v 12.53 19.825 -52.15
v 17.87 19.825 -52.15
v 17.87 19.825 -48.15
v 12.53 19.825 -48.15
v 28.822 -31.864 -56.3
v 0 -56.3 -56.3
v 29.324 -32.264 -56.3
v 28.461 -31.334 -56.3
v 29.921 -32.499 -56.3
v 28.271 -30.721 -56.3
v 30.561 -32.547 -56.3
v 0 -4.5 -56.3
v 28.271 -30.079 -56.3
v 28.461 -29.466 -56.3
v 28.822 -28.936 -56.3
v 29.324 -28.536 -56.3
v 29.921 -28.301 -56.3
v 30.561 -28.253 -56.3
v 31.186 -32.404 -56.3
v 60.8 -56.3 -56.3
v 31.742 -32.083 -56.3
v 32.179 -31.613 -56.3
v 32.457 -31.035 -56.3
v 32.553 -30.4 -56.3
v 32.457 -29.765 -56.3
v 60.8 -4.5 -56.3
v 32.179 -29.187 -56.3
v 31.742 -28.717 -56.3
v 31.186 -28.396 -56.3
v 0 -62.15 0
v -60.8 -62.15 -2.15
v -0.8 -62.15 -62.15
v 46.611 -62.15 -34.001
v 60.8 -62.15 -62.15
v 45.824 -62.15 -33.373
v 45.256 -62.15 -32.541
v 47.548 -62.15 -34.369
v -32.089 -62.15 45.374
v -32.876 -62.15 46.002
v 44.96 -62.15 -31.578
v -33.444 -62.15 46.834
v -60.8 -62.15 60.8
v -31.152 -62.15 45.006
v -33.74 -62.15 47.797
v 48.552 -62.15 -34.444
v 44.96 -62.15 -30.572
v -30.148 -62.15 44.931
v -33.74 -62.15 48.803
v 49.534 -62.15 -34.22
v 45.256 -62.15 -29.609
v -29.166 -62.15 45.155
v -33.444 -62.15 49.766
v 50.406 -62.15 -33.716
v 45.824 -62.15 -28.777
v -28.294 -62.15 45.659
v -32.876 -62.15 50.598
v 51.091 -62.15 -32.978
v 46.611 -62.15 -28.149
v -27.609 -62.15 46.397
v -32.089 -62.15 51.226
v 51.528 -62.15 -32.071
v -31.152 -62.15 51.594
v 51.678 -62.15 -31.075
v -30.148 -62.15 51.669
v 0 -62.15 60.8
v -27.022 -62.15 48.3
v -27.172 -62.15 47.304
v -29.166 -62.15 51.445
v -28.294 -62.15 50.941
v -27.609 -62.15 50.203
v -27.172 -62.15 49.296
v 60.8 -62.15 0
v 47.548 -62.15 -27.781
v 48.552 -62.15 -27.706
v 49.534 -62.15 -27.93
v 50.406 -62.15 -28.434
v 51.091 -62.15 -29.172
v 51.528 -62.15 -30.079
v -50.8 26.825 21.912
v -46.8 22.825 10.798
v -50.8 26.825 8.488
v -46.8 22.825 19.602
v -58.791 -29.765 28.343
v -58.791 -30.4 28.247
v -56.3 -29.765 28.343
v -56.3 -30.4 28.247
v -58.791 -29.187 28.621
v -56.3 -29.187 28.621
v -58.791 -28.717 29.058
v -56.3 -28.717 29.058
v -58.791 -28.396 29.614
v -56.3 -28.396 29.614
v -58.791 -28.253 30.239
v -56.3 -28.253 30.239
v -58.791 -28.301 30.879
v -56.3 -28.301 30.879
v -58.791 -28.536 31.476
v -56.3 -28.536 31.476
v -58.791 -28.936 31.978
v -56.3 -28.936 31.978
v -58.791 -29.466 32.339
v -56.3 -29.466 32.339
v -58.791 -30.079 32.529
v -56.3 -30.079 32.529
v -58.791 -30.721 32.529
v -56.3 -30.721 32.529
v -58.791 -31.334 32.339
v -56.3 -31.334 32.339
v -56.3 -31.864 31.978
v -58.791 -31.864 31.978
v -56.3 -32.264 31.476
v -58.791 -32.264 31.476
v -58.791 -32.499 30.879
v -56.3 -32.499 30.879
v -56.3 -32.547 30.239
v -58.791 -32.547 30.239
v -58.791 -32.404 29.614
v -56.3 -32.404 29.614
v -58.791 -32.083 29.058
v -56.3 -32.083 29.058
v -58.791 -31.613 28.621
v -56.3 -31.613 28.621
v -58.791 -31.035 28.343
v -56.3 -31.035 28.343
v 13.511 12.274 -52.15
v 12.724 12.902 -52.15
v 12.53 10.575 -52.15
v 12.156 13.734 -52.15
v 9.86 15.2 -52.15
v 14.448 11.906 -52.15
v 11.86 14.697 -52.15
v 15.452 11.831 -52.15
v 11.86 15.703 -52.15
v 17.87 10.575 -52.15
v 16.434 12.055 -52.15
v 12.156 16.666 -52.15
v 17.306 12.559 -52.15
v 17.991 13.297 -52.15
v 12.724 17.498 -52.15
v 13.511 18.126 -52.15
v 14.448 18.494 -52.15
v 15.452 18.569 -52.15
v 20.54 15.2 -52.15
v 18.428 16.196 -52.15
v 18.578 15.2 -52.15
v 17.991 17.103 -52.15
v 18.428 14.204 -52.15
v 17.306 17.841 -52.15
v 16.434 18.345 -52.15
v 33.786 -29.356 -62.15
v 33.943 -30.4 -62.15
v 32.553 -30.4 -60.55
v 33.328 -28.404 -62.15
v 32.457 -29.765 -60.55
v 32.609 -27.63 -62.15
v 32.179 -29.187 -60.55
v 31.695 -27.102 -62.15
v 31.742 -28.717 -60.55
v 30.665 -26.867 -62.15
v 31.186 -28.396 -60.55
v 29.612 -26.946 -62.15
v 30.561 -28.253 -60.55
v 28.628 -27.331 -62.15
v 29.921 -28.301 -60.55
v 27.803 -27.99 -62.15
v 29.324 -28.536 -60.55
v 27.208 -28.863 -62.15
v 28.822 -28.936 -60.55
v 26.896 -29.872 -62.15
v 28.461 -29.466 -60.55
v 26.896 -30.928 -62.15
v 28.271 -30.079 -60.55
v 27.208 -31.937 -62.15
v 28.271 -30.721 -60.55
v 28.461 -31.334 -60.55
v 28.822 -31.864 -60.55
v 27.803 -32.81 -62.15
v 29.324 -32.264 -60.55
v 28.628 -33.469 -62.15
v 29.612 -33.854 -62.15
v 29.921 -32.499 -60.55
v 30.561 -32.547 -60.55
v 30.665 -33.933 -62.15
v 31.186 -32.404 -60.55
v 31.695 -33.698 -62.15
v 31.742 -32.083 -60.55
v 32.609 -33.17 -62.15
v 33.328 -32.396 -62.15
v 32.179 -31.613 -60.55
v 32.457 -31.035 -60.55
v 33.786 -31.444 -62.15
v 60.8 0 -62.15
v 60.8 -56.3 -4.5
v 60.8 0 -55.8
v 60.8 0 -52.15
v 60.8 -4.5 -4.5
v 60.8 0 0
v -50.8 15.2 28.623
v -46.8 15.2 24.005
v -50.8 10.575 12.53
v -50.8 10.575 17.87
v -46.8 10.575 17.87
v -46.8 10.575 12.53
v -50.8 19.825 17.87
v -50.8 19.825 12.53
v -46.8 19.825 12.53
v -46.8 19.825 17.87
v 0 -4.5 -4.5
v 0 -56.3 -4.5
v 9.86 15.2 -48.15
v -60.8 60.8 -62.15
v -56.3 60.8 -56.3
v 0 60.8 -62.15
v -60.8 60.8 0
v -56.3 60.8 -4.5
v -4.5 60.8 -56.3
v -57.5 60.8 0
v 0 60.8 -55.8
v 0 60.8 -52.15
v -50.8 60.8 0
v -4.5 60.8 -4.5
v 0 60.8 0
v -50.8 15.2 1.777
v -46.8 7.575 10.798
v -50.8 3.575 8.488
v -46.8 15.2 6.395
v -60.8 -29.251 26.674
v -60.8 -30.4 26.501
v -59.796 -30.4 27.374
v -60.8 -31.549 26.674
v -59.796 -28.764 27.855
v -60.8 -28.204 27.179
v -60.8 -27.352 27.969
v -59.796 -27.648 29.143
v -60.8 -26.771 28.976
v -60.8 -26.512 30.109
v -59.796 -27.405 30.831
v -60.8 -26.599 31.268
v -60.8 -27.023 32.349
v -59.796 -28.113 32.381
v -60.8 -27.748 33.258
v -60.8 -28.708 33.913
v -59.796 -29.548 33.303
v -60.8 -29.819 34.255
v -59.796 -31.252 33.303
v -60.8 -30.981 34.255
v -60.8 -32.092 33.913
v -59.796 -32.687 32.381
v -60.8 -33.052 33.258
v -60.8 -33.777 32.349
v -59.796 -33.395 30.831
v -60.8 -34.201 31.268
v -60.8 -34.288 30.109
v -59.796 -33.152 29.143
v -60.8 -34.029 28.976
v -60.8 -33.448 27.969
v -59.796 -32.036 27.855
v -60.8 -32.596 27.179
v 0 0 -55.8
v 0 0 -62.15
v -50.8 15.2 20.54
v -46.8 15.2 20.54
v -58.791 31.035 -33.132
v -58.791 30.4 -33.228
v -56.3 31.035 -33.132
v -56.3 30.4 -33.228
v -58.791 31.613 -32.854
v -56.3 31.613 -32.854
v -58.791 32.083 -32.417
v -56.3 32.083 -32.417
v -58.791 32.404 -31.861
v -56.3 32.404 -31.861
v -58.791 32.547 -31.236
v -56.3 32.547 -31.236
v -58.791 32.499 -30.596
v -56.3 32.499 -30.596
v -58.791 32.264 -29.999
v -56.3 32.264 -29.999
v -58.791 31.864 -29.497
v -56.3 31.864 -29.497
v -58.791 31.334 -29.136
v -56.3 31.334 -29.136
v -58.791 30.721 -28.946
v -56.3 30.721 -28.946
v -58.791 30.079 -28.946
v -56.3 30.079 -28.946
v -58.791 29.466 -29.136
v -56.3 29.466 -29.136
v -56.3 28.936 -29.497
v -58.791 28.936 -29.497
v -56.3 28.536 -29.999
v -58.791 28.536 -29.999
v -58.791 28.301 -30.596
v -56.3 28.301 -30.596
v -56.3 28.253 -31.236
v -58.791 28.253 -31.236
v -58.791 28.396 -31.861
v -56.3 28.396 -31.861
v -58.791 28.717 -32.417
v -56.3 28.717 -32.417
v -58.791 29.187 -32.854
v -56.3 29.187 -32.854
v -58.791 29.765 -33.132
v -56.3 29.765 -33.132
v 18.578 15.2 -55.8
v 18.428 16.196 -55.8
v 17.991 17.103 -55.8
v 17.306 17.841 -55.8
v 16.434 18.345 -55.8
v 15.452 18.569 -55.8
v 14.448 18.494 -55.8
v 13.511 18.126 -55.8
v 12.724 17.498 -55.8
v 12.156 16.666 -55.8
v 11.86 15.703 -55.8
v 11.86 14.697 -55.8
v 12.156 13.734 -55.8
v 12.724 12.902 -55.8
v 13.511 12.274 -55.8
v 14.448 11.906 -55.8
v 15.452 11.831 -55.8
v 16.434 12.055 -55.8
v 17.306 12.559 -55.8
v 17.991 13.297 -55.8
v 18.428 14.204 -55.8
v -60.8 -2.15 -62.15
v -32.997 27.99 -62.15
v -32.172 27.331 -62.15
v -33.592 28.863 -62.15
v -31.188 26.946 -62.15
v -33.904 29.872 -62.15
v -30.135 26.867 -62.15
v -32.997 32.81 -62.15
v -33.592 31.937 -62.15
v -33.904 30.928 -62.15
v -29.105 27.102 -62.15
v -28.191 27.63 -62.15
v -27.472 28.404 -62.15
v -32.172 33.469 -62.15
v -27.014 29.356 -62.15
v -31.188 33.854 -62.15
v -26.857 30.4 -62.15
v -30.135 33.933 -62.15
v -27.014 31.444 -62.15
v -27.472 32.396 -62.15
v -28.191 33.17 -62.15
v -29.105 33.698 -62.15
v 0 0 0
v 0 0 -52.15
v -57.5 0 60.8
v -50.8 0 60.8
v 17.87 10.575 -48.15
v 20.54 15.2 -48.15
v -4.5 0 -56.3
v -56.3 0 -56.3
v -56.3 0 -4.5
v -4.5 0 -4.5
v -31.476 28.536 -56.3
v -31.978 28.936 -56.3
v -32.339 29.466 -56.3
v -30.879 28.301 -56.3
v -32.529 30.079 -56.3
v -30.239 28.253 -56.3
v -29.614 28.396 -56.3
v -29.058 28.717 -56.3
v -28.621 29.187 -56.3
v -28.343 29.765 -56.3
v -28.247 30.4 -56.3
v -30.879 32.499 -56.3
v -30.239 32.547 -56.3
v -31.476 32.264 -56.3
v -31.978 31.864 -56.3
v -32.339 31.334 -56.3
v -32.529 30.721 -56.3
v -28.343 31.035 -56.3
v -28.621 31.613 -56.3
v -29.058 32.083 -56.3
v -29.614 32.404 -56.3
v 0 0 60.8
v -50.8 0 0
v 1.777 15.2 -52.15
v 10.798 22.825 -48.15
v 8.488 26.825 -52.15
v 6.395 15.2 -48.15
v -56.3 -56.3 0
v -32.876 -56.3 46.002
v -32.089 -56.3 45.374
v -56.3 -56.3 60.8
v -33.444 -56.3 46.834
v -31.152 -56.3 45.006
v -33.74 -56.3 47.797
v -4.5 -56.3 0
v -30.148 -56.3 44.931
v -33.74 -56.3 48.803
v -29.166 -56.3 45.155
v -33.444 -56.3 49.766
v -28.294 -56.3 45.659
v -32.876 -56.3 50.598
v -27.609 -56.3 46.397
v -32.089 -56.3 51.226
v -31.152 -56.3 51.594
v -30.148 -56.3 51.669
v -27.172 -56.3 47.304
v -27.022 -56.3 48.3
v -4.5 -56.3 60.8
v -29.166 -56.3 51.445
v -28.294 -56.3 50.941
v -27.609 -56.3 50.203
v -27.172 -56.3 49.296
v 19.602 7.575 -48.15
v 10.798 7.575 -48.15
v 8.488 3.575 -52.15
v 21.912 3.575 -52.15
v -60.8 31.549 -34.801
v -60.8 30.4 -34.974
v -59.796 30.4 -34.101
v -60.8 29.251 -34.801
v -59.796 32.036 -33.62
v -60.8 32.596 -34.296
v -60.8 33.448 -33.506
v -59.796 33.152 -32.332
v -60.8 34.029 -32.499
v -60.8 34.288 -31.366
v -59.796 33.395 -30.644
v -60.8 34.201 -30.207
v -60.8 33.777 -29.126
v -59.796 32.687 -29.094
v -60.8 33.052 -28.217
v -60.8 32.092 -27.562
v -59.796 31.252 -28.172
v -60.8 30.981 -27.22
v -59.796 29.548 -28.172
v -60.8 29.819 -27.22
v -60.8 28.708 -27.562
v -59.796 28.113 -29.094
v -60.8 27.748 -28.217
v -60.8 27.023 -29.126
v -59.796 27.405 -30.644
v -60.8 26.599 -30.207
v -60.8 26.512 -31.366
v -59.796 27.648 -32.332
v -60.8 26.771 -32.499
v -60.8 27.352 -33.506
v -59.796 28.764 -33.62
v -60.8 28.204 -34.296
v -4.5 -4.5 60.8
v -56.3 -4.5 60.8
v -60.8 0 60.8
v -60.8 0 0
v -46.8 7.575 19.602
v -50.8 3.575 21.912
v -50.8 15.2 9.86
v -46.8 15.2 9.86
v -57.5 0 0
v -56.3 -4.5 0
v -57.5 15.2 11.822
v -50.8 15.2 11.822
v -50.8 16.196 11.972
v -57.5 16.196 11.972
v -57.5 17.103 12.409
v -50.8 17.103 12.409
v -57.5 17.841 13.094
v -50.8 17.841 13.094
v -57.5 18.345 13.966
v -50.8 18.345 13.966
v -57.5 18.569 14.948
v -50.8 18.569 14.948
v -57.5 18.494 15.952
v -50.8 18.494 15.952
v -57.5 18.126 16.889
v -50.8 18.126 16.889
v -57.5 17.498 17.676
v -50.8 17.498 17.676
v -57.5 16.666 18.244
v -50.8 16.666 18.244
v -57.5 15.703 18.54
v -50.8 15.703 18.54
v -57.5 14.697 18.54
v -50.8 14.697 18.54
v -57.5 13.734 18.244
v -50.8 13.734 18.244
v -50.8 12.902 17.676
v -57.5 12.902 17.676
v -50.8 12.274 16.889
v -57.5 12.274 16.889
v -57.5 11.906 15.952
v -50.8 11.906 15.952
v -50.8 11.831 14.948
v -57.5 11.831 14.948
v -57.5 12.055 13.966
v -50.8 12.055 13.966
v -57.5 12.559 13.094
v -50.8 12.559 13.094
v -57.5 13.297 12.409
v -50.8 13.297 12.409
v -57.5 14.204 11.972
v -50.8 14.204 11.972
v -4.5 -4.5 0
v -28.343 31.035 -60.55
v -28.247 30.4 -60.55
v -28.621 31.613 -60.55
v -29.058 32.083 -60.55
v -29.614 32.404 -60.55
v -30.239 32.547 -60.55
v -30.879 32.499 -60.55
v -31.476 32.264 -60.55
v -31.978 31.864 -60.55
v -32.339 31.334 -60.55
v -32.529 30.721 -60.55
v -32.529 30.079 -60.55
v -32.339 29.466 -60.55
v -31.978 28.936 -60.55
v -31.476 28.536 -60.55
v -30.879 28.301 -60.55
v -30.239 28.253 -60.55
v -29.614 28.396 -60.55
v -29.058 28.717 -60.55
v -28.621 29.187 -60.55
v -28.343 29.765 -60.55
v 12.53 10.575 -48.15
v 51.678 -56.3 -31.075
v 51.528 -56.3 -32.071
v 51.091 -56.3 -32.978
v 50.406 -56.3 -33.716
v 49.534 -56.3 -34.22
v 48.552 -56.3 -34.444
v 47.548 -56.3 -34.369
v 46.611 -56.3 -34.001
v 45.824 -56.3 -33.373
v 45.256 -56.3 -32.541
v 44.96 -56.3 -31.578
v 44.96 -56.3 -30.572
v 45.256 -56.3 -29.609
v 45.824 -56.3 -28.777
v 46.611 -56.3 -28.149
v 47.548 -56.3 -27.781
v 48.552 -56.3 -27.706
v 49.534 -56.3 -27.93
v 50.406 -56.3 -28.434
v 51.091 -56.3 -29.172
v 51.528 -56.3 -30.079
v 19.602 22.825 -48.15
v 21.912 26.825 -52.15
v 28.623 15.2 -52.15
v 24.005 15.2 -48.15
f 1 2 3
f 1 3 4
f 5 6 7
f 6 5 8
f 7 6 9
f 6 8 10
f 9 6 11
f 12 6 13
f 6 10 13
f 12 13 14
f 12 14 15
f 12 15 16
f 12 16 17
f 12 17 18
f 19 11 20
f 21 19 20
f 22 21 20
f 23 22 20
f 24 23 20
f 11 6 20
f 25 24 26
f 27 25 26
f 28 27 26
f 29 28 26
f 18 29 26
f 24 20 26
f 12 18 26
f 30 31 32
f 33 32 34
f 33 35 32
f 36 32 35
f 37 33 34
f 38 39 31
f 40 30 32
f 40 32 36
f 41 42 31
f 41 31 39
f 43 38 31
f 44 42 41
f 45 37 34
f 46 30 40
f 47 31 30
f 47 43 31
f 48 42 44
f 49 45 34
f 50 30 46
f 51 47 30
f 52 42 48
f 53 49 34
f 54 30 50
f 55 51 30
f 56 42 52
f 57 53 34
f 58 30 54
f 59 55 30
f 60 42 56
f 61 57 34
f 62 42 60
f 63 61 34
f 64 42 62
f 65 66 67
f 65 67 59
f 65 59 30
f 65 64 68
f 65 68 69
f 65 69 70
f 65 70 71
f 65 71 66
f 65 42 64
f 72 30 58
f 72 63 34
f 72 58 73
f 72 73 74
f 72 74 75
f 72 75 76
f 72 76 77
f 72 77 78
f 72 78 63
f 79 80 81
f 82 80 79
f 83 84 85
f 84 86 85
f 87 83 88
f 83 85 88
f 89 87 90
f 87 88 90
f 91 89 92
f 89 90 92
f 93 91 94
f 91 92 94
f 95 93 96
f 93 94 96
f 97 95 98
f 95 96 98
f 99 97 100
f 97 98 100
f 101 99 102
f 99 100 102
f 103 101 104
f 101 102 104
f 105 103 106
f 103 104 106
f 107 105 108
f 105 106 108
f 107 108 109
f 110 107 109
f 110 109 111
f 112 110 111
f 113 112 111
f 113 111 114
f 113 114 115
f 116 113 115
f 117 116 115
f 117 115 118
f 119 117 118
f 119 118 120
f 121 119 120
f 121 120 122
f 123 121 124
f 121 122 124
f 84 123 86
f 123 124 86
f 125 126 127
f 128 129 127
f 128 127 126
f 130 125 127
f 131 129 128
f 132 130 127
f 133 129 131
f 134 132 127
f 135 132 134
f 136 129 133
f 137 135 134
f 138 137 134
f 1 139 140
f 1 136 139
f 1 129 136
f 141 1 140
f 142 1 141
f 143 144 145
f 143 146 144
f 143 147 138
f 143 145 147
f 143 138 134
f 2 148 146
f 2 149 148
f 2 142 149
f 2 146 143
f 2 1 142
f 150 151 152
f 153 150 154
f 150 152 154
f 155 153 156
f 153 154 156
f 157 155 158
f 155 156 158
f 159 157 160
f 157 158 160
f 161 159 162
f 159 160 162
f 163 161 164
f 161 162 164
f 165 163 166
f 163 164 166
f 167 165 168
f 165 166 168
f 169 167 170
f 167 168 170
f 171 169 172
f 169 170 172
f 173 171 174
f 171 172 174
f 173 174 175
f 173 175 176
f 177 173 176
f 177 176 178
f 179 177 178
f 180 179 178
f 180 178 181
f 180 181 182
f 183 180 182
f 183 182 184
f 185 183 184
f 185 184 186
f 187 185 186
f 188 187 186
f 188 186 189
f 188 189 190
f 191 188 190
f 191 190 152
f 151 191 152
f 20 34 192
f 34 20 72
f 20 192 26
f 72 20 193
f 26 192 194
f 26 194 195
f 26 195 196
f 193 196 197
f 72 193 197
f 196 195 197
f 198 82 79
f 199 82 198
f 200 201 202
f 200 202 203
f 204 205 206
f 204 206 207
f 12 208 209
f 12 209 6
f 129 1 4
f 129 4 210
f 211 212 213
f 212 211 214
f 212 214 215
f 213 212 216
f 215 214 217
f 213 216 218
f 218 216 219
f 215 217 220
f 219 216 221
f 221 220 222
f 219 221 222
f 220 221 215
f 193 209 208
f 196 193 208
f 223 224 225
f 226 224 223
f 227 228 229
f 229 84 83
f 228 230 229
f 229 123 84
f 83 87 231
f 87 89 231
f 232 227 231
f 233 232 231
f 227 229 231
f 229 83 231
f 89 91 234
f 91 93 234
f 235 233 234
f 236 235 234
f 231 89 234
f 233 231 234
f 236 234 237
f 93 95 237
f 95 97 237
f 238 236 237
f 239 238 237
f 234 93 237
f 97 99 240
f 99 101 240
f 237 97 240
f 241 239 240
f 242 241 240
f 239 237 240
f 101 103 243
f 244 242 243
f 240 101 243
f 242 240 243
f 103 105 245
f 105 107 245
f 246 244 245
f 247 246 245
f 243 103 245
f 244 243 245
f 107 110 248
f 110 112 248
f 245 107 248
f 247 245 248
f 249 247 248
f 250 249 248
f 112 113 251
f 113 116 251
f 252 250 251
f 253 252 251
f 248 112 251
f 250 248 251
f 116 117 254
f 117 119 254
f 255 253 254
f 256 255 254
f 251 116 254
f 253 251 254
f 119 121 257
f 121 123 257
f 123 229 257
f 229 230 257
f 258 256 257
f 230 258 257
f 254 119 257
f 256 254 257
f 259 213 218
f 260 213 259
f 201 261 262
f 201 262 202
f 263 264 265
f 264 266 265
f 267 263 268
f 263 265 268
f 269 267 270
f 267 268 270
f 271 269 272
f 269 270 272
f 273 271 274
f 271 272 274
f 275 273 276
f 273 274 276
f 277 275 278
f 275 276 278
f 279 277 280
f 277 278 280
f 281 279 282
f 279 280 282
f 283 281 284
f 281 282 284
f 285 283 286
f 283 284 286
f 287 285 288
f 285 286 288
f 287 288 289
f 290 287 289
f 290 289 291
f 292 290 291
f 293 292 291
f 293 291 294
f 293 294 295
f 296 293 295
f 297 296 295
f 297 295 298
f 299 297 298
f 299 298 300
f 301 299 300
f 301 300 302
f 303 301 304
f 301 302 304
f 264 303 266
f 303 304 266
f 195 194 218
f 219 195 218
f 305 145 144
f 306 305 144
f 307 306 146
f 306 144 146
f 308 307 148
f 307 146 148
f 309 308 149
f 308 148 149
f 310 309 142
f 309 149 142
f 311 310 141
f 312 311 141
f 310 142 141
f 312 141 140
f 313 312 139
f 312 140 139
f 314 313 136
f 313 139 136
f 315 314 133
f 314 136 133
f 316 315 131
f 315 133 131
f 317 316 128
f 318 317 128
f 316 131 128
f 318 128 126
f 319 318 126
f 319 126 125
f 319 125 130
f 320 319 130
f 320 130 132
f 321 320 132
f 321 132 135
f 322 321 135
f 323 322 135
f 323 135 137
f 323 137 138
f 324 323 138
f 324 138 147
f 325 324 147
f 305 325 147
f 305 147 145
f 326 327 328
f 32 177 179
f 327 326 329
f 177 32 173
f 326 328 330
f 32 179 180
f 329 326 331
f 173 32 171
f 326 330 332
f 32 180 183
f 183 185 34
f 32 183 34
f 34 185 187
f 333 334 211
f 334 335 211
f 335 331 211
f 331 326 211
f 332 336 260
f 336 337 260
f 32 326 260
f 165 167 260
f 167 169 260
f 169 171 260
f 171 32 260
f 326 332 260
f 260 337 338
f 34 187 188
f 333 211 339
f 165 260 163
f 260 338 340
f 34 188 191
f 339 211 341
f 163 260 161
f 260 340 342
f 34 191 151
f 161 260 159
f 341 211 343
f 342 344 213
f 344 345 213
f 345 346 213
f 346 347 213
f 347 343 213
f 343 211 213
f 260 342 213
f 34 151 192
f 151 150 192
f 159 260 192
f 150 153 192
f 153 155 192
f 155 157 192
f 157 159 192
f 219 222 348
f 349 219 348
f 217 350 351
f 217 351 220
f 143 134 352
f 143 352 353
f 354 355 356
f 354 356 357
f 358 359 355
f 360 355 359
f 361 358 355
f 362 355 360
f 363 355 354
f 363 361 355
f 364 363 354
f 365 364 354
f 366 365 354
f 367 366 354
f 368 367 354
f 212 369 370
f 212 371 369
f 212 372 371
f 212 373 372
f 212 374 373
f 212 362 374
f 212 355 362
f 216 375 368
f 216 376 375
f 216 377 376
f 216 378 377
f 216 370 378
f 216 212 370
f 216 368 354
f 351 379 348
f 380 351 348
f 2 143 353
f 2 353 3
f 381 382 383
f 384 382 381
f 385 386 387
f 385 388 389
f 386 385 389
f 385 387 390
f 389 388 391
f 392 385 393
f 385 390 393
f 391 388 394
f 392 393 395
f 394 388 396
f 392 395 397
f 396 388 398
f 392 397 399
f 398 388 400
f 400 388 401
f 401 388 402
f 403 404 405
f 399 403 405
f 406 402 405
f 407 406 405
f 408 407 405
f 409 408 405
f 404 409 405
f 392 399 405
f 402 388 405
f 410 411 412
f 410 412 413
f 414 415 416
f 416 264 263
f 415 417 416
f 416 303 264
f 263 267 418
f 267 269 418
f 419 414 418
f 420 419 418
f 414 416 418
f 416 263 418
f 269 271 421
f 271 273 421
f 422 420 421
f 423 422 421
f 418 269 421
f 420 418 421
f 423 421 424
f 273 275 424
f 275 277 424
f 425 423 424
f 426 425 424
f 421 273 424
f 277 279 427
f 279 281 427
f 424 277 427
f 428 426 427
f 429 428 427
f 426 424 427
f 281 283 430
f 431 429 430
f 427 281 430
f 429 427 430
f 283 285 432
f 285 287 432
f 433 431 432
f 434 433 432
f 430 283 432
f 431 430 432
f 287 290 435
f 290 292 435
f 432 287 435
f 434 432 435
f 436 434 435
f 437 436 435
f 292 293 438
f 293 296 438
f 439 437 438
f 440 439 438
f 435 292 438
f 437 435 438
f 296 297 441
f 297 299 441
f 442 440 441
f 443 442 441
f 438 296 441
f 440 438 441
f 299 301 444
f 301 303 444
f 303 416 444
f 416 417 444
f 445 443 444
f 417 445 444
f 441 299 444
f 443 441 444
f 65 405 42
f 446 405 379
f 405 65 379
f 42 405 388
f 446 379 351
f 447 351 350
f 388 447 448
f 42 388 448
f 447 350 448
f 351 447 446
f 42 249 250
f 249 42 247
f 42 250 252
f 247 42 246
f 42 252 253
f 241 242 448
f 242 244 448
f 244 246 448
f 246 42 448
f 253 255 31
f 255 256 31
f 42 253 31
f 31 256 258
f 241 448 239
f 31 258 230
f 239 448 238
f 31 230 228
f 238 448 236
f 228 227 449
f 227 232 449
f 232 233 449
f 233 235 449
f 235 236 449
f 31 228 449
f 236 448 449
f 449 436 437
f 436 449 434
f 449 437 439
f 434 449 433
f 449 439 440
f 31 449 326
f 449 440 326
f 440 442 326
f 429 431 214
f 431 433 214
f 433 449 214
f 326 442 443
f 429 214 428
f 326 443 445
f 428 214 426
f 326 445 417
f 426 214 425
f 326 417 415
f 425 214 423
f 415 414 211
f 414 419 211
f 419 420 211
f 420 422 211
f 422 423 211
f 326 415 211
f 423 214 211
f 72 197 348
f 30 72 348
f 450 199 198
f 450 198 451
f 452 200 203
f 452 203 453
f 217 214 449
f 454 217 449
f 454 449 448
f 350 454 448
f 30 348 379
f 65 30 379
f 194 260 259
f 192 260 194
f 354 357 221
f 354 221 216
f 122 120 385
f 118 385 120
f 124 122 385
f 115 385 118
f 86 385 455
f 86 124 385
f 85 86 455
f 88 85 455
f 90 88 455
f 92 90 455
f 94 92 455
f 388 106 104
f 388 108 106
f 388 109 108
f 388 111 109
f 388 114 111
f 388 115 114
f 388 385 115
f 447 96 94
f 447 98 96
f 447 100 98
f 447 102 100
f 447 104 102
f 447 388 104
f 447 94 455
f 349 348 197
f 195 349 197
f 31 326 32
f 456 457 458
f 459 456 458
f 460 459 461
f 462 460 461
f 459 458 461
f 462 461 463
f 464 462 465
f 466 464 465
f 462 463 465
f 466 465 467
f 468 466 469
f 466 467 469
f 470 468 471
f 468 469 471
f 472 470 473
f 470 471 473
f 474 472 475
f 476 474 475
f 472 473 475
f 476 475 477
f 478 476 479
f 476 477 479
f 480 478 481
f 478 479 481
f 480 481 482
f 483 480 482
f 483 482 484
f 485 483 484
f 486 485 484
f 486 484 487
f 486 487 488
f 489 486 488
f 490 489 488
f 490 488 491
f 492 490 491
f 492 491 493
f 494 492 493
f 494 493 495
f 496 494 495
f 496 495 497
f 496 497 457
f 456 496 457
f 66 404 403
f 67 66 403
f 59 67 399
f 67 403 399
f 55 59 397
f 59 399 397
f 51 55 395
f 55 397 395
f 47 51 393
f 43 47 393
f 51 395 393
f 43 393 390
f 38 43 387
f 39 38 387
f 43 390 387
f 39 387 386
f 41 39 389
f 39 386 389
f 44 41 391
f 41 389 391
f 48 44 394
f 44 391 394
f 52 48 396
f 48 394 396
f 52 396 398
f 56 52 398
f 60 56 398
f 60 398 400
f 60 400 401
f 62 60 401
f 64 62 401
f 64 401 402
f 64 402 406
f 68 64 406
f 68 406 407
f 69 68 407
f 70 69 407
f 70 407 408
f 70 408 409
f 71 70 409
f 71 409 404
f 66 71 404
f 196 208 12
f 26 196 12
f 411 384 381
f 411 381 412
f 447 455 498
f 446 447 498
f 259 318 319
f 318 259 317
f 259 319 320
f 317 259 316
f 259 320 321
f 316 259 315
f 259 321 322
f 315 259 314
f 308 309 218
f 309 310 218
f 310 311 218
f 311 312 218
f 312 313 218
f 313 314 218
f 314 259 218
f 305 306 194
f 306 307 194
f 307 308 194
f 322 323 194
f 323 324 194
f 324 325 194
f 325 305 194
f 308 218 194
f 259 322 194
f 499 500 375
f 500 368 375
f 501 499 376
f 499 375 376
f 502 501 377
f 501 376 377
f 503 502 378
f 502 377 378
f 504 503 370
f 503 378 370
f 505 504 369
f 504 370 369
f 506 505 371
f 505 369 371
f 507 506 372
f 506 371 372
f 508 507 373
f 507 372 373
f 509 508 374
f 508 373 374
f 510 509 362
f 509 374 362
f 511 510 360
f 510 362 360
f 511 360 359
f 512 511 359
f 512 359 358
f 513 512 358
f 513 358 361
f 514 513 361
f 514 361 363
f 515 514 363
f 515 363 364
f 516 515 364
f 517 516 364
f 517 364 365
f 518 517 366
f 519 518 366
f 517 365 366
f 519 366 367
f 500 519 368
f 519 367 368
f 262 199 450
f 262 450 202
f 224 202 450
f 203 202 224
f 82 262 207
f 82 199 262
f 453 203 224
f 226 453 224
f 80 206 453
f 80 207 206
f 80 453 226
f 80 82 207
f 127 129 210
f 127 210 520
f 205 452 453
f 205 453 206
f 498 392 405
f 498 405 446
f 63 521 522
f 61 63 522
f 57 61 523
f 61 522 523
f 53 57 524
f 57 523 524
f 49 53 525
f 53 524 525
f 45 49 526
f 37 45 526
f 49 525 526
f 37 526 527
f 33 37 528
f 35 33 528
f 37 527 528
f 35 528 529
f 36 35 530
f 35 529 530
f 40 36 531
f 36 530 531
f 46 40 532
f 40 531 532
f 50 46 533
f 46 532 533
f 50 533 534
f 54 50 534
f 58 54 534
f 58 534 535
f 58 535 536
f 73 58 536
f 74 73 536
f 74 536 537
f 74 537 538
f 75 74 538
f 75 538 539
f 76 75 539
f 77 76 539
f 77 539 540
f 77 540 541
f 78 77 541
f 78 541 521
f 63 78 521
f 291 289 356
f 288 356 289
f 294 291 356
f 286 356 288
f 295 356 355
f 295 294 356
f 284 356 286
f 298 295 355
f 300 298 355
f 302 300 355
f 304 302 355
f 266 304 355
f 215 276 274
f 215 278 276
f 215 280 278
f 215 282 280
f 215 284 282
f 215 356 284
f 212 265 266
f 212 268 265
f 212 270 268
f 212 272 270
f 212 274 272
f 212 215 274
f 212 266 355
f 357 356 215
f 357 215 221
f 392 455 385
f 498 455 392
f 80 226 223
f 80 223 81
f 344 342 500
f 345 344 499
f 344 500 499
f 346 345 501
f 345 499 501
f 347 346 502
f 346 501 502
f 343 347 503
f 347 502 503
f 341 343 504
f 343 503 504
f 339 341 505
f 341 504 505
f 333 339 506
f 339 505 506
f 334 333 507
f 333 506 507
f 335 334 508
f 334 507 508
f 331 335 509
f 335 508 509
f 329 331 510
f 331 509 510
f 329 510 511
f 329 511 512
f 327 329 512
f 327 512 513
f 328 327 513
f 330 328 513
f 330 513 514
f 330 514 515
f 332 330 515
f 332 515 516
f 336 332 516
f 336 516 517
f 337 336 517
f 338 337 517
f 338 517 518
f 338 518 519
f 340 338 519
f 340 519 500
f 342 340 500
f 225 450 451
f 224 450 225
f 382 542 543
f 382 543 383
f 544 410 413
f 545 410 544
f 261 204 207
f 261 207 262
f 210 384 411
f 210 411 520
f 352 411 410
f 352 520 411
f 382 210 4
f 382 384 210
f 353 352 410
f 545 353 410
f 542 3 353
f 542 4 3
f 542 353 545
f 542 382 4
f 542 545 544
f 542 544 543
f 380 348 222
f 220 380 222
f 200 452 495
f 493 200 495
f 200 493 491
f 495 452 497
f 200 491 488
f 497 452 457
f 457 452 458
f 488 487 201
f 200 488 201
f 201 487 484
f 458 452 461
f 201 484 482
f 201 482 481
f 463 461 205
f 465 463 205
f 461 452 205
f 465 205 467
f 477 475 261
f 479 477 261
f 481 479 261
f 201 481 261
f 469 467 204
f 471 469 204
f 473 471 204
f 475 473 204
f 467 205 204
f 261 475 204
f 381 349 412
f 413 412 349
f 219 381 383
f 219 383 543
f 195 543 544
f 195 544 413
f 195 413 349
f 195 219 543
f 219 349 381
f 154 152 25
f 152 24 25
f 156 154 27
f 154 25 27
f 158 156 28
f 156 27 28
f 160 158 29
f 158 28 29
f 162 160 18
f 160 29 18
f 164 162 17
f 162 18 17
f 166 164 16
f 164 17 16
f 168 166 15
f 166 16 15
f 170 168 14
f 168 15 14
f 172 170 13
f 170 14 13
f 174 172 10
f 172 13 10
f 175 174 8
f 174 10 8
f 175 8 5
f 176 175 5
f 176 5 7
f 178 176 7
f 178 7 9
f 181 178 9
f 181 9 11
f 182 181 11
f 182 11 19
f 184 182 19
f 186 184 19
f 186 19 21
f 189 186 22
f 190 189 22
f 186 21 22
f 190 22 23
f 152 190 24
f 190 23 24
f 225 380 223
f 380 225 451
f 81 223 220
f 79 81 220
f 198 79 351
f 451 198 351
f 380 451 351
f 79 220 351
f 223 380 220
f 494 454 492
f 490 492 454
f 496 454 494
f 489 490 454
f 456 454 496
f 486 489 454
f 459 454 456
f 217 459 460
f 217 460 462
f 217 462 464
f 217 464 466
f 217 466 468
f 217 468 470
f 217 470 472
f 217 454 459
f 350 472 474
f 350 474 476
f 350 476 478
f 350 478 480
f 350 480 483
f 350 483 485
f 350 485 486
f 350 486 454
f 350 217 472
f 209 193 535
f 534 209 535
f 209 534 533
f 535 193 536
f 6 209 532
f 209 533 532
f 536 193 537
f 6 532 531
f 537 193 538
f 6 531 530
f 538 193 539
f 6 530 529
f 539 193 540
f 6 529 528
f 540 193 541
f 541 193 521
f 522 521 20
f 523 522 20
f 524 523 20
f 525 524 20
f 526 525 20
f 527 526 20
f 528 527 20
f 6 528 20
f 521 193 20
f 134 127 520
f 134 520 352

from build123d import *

# Parameters (mm, degrees)
ESQUISSE1_W                                       = 121.6
ESQUISSE1_H                                       = 121.6
BOSS_EXTRU_1_DEPTH                                = 60.8
ESQUISSE2_W                                       = 60.8
ESQUISSE2_H                                       = 60.8
ENL_V_MAT_EXTRU_1_DEPTH                           = 149.928976361
ESQUISSE3_W                                       = 60.8
ESQUISSE3_H                                       = 60.8
ENL_V_MAT_EXTRU_2_DEPTH                           = 106.3086891
ESQUISSE4_W                                       = 60.8
ESQUISSE4_H                                       = 60.8
ENL_V_MAT_EXTRU_3_DEPTH                           = 106.3086891
ESQUISSE5_W                                       = 51.8
ESQUISSE5_H                                       = 51.8
ENL_V_MAT_EXTRU_4_DEPTH                           = 60.8
ESQUISSE6_W                                       = 51.8
ESQUISSE6_H                                       = 51.8
ENL_V_MAT_EXTRU_5_DEPTH                           = 60.8
ESQUISSE7_W                                       = 51.8
ESQUISSE7_H                                       = 51.8
ENL_V_MAT_EXTRU_6_DEPTH                           = 60.8
BOSS_EXTRU_8_DEPTH                                = 1.35
FRAISAGE_POUR_VIS_T_TE_FRAIS_E_BOMB_E_D           = 4.3053
FRAISAGE_POUR_VIS_T_TE_FRAIS_E_BOMB_E_DEPTH       = 20
FRAISAGE_POUR_VIS_T_TE_FRAIS_E_BOMB_E_CSINK_D     = 7.0866
FRAISAGE_POUR_VIS_T_TE_FRAIS_E_BOMB_E_CSINK_ANGLE = 82
FRAISAGE_POUR_VIS_T_TE_FRAIS_E_BOMB_E_TIP         = 1.293442612
FRAISAGE_POUR_VIS_T_TE_FRAIS_E_6_PAN_D            = 4.3053
FRAISAGE_POUR_VIS_T_TE_FRAIS_E_6_PAN_DEPTH        = 20
FRAISAGE_POUR_VIS_T_TE_FRAIS_E_6_PAN_CSINK_D      = 7.7978
FRAISAGE_POUR_VIS_T_TE_FRAIS_E_6_PAN_CSINK_ANGLE  = 82
FRAISAGE_POUR_VIS_T_TE_FRAIS_E_6_PAN_TIP          = 1.293442612
BOSS_EXTRU_3_DEPTH                                = 10
ENL_V_MAT_EXTRU_13_DEPTH                          = 6.35
BOSS_EXTRU_2_DEPTH                                = 10
ENL_V_MAT_EXTRU_12_DEPTH                          = 3.3
D_GAGEMENT_1_42_D                                 = 6.7564
D_GAGEMENT_1_42_DEPTH                             = 20
D_GAGEMENT_1_42_TIP                               = 2.029827343
D_GAGEMENT_1_43_D                                 = 6.7564
D_GAGEMENT_1_43_DEPTH                             = 20
D_GAGEMENT_1_43_TIP                               = 2.029827343
BOSS_EXTRU_5_DEPTH                                = 4
CHANFREIN3_SIZE                                   = 4
BOSS_EXTRU_6_DEPTH                                = 4
CHANFREIN4_SIZE                                   = 4
BOSS_EXTRU_7_DEPTH                                = 1.35
D_GAGEMENT_1_44_D                                 = 6.7564
D_GAGEMENT_1_44_DEPTH                             = 20
D_GAGEMENT_1_44_TIP                               = 2.029827343
CHANFREIN1_START                                  = -108
CHANFREIN1_OUTLINE_W                              = 77
CHANFREIN1_OUTLINE_H                              = 88
CHANFREIN1_DEPTH                                  = 35.773481324


with BuildPart() as part:
    # Esquisse1 → Boss.-Extru.1 (new, symmetric)
    with BuildSketch(Plane.XY):
        Rectangle(ESQUISSE1_W, ESQUISSE1_H)
    extrude(amount=BOSS_EXTRU_1_DEPTH, both=True)

    # Esquisse2 → Enlèv. mat.-Extru.1 (cut, through all)
    with BuildSketch(Plane.XY.offset(60.8)):
        with Locations((30.4, 30.4)):
            Rectangle(ESQUISSE2_W, ESQUISSE2_H)
    extrude(amount=-ENL_V_MAT_EXTRU_1_DEPTH, mode=Mode.SUBTRACT)

    # Esquisse3 → Enlèv. mat.-Extru.2 (cut, through all)
    with BuildSketch(Plane(origin=(0, 0, 0), x_dir=(0, 0, -1), z_dir=(1, 0, 0))):
        with Locations((-30.4, 30.4)):
            Rectangle(ESQUISSE3_W, ESQUISSE3_H)
    extrude(amount=-ENL_V_MAT_EXTRU_2_DEPTH, mode=Mode.SUBTRACT)

    # Esquisse4 → Enlèv. mat.-Extru.3 (cut, through all)
    with BuildSketch(Plane(origin=(0, 0, 0), x_dir=(1, 0, 0), z_dir=(0, 1, 0))):
        with Locations((30.4, -30.4)):
            Rectangle(ESQUISSE4_W, ESQUISSE4_H)
    extrude(amount=-ENL_V_MAT_EXTRU_3_DEPTH, mode=Mode.SUBTRACT)

    # Esquisse5 → Enlèv. mat.-Extru.4 (cut)
    with BuildSketch(Plane.XY.offset(60.8)):
        with Locations((-30.4, -30.4)):
            Rectangle(ESQUISSE5_W, ESQUISSE5_H)
    extrude(amount=-ENL_V_MAT_EXTRU_4_DEPTH, mode=Mode.SUBTRACT)

    # Esquisse6 → Enlèv. mat.-Extru.5 (cut)
    with BuildSketch(Plane(origin=(60.8, 0, 0), x_dir=(0, 0, -1), z_dir=(1, 0, 0))):
        with Locations((30.4, -30.4)):
            Rectangle(ESQUISSE6_W, ESQUISSE6_H)
    extrude(amount=-ENL_V_MAT_EXTRU_5_DEPTH, mode=Mode.SUBTRACT)

    # Esquisse7 → Enlèv. mat.-Extru.6 (cut)
    with BuildSketch(Plane(origin=(0, 60.8, 0), x_dir=(1, 0, 0), z_dir=(0, 1, 0))):
        with Locations((-30.4, 30.4)):
            Rectangle(ESQUISSE7_W, ESQUISSE7_H)
    extrude(amount=-ENL_V_MAT_EXTRU_6_DEPTH, mode=Mode.SUBTRACT)

    # Esquisse40 → Boss.-Extru.8 (add)
    with BuildSketch(Plane(origin=(0, 0, -60.8), x_dir=(-1, 0, 0), z_dir=(0, 0, -1))):
        Polygon((0, 0), (-60.8, 0), (-60.8, -60.8), (60.8, -60.8), (60.8, 60.8), (0, 60.8), align=None)
    extrude(amount=BOSS_EXTRU_8_DEPTH)

    # Fraisage pour vis à tête fraisée bombée #61
    with Locations(Plane(origin=(0, 0, -62.15), x_dir=(-1, 0, 0), z_dir=(0, 0, -1))):
        with Locations((-30.4, -30.4), (30.4, 30.4)):
            CounterSinkHole(FRAISAGE_POUR_VIS_T_TE_FRAIS_E_BOMB_E_D / 2, FRAISAGE_POUR_VIS_T_TE_FRAIS_E_BOMB_E_CSINK_D / 2, depth=FRAISAGE_POUR_VIS_T_TE_FRAIS_E_BOMB_E_DEPTH, counter_sink_angle=FRAISAGE_POUR_VIS_T_TE_FRAIS_E_BOMB_E_CSINK_ANGLE)
            with Locations((0, 0, -(FRAISAGE_POUR_VIS_T_TE_FRAIS_E_BOMB_E_DEPTH + FRAISAGE_POUR_VIS_T_TE_FRAIS_E_BOMB_E_TIP / 2))):  # 118° drill point
                Cone(0, FRAISAGE_POUR_VIS_T_TE_FRAIS_E_BOMB_E_D / 2, FRAISAGE_POUR_VIS_T_TE_FRAIS_E_BOMB_E_TIP, mode=Mode.SUBTRACT)

    # Fraisage pour vis à tête fraisée à 6 pans creux #61
    with Locations(Plane.ZY.offset(60.8)):
        with Locations((30.4, -30.4), (-31.075, 30.4)):
            CounterSinkHole(FRAISAGE_POUR_VIS_T_TE_FRAIS_E_6_PAN_D / 2, FRAISAGE_POUR_VIS_T_TE_FRAIS_E_6_PAN_CSINK_D / 2, depth=FRAISAGE_POUR_VIS_T_TE_FRAIS_E_6_PAN_DEPTH, counter_sink_angle=FRAISAGE_POUR_VIS_T_TE_FRAIS_E_6_PAN_CSINK_ANGLE)
            with Locations((0, 0, -(FRAISAGE_POUR_VIS_T_TE_FRAIS_E_6_PAN_DEPTH + FRAISAGE_POUR_VIS_T_TE_FRAIS_E_6_PAN_TIP / 2))):  # 118° drill point
                Cone(0, FRAISAGE_POUR_VIS_T_TE_FRAIS_E_6_PAN_D / 2, FRAISAGE_POUR_VIS_T_TE_FRAIS_E_6_PAN_TIP, mode=Mode.SUBTRACT)

    # Esquisse21 → Boss.-Extru.3 (add)
    with BuildSketch(Plane(origin=(0, 0, -62.15), x_dir=(-1, 0, 0), z_dir=(0, 0, -1))):
        Polygon((0, 0), (-60.8, 0), (0, 60.8), align=None)
    extrude(amount=-BOSS_EXTRU_3_DEPTH)

    # Esquisse31 → Enlèv. mat.-Extru.13 (cut)
    with BuildSketch(Plane(origin=(0, 0, -62.15), x_dir=(-1, 0, 0), z_dir=(0, 0, -1))):
        Polygon((0, 60.8), (0, 0), (-60.8, 0), align=None)
    extrude(amount=-ENL_V_MAT_EXTRU_13_DEPTH, mode=Mode.SUBTRACT)

    # Esquisse17 → Boss.-Extru.2 (add)
    with BuildSketch(Plane.ZY.offset(60.8)):
        Polygon((0, 0), (60.8, 0), (0, 60.8), align=None)
    extrude(amount=-BOSS_EXTRU_2_DEPTH)

    # Esquisse26 → Enlèv. mat.-Extru.12 (cut)
    with BuildSketch(Plane.ZY.offset(60.8)):
        Polygon((0, 60.8), (0, 0), (60.8, 0), align=None)
    extrude(amount=-ENL_V_MAT_EXTRU_12_DEPTH, mode=Mode.SUBTRACT)

    # Dégagement 1/42
    with Locations(Plane.ZY.offset(57.5)):
        with Locations((15.2, 15.2)):
            Hole(D_GAGEMENT_1_42_D / 2, depth=D_GAGEMENT_1_42_DEPTH)
            with Locations((0, 0, -(D_GAGEMENT_1_42_DEPTH + D_GAGEMENT_1_42_TIP / 2))):  # 118° drill point
                Cone(0, D_GAGEMENT_1_42_D / 2, D_GAGEMENT_1_42_TIP, mode=Mode.SUBTRACT)

    # Dégagement 1/43
    with Locations(Plane(origin=(0, 0, -55.8), x_dir=(-1, 0, 0), z_dir=(0, 0, -1))):
        with Locations((-15.2, 15.2)):
            Hole(D_GAGEMENT_1_43_D / 2, depth=D_GAGEMENT_1_43_DEPTH)
            with Locations((0, 0, -(D_GAGEMENT_1_43_DEPTH + D_GAGEMENT_1_43_TIP / 2))):  # 118° drill point
                Cone(0, D_GAGEMENT_1_43_D / 2, D_GAGEMENT_1_43_TIP, mode=Mode.SUBTRACT)

    # Esquisse30 → Boss.-Extru.5 (add)
    with BuildSketch(Plane(origin=(-50.8, 0, 0), x_dir=(0, 0, -1), z_dir=(1, 0, 0))):
        Polygon((-6.395408395, 15.2), (-10.797704197, 22.825), (-19.602295803, 22.825), (-24.004591605, 15.2), (-19.602295803, 7.575), (-10.797704197, 7.575), align=None)
        Polygon((-9.85951001, 15.2), (-12.529755005, 19.825), (-17.870244995, 19.825), (-20.54048999, 15.2), (-17.870244995, 10.575), (-12.529755005, 10.575), align=None, mode=Mode.SUBTRACT)
    extrude(amount=BOSS_EXTRU_5_DEPTH)

    # Chanfrein3
    chanfrein3_edges = [part.edges().sort_by_distance(p)[0] for p in [
        (-50.8, 7.575, 15.2),
        (-50.8, 11.3875, 8.596556296),
        (-50.8, 19.0125, 8.596556296),
        (-50.8, 22.825, 15.2),
        (-50.8, 11.3875, 21.803443704),
        (-50.8, 19.0125, 21.803443704),
    ]]
    chamfer(chanfrein3_edges, length=CHANFREIN3_SIZE - 0.0001)  # a hair under: the kernel refuses the full size

    # Esquisse36 → Boss.-Extru.6 (add)
    with BuildSketch(Plane.XY.offset(-52.15)):
        Polygon((19.602295803, 22.825), (10.797704197, 22.825), (6.395408395, 15.2), (10.797704197, 7.575), (19.602295803, 7.575), (24.004591605, 15.2), align=None)
        Polygon((20.54048999, 15.2), (17.870244995, 19.825), (12.529755005, 19.825), (9.85951001, 15.2), (12.529755005, 10.575), (17.870244995, 10.575), align=None, mode=Mode.SUBTRACT)
    extrude(amount=BOSS_EXTRU_6_DEPTH)

    # Chanfrein4
    chanfrein4_edges = [part.edges().sort_by_distance(p)[0] for p in [
        (8.596556296, 11.3875, -52.15),
        (8.596556296, 19.0125, -52.15),
        (15.2, 7.575, -52.15),
        (21.803443704, 11.3875, -52.15),
        (21.803443704, 19.0125, -52.15),
        (15.2, 22.825, -52.15),
    ]]
    chamfer(chanfrein4_edges, length=CHANFREIN4_SIZE - 0.0001)  # a hair under: the kernel refuses the full size

    # Esquisse39 → Boss.-Extru.7 (add)
    with BuildSketch(Plane.XZ.offset(60.8)):
        Polygon((0, 0), (0, 60.8), (-60.8, 60.8), (-60.8, -62.15), (60.8, -62.15), (60.8, 0), align=None)
    extrude(amount=BOSS_EXTRU_7_DEPTH)

    # Dégagement 1/44
    with Locations(Plane(origin=(0, -62.15, 0), x_dir=(-1, 0, 0), z_dir=(0, -1, 0))):
        with Locations((-48.3, 31.075), (30.4, -48.3)):
            Hole(D_GAGEMENT_1_44_D / 2, depth=D_GAGEMENT_1_44_DEPTH)
            with Locations((0, 0, -(D_GAGEMENT_1_44_DEPTH + D_GAGEMENT_1_44_TIP / 2))):  # 118° drill point
                Cone(0, D_GAGEMENT_1_44_D / 2, D_GAGEMENT_1_44_TIP, mode=Mode.SUBTRACT)

    # Chanfrein1: read off the stored shape, not the designer's step
    # Chanfrein1 outline → Chanfrein1 (cut)
    with BuildSketch(Plane(origin=(0, 0, 0), x_dir=(0.816496580927726, -0.40824829046386324, -0.40824829046386263), z_dir=(0.5773502691896256, 0.5773502691896264, 0.5773502691896255)).offset(CHANFREIN1_START)):
        with Locations((13.5, 0)):
            Rectangle(CHANFREIN1_OUTLINE_W, CHANFREIN1_OUTLINE_H)
    extrude(amount=CHANFREIN1_DEPTH, mode=Mode.SUBTRACT)


solid = part.part
